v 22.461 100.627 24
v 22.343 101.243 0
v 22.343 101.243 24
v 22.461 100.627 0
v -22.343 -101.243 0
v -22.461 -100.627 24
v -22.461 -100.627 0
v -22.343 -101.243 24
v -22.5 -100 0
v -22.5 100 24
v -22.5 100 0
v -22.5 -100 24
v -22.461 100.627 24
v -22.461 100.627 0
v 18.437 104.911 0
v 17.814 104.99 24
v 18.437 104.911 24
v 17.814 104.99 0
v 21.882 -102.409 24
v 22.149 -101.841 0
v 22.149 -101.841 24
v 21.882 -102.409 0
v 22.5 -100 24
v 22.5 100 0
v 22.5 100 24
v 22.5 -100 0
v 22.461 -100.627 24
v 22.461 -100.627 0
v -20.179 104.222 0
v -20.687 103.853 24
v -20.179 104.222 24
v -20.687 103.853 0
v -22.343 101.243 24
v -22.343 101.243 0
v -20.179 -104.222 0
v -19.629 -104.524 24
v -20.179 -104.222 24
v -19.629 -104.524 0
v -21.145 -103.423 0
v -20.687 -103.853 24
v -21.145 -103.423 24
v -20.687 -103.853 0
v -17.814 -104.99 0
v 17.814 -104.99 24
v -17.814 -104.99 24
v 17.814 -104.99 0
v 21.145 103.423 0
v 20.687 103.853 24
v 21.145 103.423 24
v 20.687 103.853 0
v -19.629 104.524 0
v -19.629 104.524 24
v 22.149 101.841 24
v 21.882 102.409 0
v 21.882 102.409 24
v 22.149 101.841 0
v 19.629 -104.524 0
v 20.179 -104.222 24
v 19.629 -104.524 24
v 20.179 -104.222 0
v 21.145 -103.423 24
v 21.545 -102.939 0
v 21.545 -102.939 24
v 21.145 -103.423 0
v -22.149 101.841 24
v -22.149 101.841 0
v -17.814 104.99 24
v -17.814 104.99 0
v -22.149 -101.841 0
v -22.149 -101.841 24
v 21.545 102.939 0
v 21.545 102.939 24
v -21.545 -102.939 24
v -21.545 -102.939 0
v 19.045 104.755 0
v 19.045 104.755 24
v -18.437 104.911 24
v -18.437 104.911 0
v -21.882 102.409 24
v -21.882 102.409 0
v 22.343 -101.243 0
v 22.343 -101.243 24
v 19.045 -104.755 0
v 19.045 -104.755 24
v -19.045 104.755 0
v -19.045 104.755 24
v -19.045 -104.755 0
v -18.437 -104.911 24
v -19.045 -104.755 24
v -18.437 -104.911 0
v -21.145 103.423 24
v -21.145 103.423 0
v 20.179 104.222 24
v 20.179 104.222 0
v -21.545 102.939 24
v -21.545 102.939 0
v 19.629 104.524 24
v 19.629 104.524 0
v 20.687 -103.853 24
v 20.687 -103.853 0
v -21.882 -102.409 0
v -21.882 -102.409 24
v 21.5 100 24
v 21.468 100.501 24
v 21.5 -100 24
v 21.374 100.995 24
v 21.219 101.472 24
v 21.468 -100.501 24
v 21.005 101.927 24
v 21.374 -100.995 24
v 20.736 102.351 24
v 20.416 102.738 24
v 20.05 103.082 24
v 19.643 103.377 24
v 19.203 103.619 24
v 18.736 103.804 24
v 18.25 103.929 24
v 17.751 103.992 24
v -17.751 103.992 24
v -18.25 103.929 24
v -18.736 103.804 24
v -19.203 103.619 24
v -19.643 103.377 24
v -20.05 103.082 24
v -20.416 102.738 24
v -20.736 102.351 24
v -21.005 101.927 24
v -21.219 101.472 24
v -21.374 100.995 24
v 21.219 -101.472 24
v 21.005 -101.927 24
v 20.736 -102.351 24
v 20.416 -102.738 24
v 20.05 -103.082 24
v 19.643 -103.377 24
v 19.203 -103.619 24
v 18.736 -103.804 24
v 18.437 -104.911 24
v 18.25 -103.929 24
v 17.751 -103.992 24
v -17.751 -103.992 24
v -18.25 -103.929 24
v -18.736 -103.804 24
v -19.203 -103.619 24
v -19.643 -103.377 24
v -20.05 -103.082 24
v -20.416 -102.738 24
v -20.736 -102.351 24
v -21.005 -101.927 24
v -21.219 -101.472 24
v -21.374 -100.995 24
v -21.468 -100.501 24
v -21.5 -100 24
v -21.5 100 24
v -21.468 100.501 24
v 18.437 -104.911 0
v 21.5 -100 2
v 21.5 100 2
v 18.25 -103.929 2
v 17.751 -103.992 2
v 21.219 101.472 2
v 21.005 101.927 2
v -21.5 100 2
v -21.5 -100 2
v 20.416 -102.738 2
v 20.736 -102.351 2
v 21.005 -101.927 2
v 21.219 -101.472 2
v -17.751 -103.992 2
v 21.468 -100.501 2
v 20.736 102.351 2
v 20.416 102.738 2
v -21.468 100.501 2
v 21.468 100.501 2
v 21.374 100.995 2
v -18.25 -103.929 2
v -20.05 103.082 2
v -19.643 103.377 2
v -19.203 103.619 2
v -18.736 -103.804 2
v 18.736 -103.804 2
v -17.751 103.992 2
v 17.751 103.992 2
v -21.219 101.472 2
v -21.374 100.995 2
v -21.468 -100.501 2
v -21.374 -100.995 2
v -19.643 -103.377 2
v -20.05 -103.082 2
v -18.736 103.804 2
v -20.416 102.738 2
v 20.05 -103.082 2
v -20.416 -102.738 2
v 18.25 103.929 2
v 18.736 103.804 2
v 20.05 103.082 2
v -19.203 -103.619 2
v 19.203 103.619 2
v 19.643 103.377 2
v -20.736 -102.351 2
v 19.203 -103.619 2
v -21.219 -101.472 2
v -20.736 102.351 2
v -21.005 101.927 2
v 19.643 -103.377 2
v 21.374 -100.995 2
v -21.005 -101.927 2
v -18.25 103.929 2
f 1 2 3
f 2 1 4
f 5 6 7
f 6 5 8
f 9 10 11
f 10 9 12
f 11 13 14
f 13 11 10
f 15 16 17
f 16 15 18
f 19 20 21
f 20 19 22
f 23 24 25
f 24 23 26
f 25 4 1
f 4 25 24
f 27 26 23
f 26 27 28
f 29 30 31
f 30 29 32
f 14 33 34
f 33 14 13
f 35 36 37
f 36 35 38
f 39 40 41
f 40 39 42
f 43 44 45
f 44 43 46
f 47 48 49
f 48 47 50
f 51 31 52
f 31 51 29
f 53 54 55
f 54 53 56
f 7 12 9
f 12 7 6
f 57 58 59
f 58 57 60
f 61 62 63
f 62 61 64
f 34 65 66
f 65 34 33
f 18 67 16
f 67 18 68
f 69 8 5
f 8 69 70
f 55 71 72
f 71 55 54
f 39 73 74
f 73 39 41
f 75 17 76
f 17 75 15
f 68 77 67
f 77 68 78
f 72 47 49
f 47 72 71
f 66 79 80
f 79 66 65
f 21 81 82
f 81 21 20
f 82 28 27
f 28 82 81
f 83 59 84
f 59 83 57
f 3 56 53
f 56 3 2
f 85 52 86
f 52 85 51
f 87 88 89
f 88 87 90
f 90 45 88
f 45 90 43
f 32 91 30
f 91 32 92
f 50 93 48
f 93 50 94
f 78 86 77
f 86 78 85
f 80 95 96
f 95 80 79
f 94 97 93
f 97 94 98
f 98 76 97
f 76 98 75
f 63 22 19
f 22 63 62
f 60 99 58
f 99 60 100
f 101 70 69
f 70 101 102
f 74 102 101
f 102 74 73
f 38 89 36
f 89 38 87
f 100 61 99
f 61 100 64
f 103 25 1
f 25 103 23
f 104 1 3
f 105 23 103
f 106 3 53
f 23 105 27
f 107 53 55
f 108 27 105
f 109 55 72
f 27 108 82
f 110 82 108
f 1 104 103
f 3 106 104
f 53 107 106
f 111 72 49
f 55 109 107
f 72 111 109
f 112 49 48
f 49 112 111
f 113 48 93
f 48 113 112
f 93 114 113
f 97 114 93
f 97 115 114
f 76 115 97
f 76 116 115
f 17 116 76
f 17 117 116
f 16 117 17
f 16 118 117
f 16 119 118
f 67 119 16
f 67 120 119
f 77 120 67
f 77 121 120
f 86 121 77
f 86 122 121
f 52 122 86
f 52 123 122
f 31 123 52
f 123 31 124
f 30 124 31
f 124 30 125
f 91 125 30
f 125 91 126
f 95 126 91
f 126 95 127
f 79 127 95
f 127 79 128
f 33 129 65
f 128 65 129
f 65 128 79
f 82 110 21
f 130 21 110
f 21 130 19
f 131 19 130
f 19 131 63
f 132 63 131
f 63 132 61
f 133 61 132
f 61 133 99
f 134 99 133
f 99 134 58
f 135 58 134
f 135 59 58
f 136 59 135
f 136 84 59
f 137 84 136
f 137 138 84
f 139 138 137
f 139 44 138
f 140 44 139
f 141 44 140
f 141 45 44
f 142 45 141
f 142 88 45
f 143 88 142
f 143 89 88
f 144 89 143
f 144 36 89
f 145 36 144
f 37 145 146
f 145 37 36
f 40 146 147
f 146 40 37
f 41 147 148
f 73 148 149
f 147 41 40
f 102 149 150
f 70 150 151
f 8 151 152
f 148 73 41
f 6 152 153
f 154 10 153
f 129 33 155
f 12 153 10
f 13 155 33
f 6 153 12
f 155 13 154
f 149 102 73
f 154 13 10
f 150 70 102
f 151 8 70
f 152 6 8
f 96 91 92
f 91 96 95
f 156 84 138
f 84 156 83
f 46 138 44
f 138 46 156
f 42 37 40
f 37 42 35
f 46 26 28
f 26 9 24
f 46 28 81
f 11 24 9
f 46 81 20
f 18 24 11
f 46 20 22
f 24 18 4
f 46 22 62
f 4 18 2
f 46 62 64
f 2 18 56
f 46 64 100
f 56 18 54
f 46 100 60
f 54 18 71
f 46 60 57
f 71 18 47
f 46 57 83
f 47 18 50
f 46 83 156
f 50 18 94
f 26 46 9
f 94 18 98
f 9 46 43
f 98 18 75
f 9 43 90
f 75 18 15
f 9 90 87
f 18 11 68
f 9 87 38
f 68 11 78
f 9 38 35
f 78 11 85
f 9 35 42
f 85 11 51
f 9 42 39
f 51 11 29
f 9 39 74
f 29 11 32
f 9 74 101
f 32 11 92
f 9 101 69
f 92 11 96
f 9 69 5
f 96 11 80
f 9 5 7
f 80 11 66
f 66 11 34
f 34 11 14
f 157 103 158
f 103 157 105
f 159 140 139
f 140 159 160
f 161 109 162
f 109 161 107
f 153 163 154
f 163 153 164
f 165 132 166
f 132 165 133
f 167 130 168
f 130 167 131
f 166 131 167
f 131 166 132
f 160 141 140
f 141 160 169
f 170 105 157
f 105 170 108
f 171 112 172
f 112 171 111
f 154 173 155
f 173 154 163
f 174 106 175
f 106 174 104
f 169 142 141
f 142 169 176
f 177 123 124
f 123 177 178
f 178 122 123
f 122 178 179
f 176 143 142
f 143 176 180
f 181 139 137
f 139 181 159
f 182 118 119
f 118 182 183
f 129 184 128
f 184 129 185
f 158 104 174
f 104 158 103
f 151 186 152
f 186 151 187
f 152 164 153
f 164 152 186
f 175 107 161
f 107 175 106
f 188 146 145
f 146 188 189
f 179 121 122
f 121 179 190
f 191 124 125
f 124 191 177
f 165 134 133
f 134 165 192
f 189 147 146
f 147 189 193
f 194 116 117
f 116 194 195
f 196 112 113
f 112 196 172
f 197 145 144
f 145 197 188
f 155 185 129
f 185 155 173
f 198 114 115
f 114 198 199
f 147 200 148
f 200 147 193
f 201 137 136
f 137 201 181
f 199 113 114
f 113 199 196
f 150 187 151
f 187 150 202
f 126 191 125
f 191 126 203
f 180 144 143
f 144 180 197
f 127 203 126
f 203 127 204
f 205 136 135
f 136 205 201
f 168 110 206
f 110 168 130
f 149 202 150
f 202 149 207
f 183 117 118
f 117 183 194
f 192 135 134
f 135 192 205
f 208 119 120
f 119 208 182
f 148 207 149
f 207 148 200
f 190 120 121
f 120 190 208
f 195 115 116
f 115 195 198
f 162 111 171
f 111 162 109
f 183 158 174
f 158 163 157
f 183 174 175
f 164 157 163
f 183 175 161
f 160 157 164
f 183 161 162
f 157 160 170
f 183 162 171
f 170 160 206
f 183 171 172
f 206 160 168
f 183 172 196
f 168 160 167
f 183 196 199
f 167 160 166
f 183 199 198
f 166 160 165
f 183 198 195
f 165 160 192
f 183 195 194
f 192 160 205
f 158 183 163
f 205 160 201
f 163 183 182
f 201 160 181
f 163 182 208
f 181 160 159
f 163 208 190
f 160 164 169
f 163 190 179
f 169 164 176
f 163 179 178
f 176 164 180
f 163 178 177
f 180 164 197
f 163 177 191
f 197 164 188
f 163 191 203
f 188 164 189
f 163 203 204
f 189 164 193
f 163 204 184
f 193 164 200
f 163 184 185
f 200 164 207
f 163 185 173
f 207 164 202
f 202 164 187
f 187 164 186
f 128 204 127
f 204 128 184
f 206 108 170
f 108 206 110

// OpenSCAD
$fn = 50;


difference() {
	union() {
		hull() {
			translate(v = [-17.5000000000, 100.0000000000, 0]) {
				cylinder(h = 24, r = 5);
			}
			translate(v = [17.5000000000, 100.0000000000, 0]) {
				cylinder(h = 24, r = 5);
			}
			translate(v = [-17.5000000000, -100.0000000000, 0]) {
				cylinder(h = 24, r = 5);
			}
			translate(v = [17.5000000000, -100.0000000000, 0]) {
				cylinder(h = 24, r = 5);
			}
		}
	}
	union() {
		translate(v = [0, 0, 2]) {
			hull() {
				translate(v = [-17.5000000000, 100.0000000000, 0]) {
					cylinder(h = 22, r = 4);
				}
				translate(v = [17.5000000000, 100.0000000000, 0]) {
					cylinder(h = 22, r = 4);
				}
				translate(v = [-17.5000000000, -100.0000000000, 0]) {
					cylinder(h = 22, r = 4);
				}
				translate(v = [17.5000000000, -100.0000000000, 0]) {
					cylinder(h = 22, r = 4);
				}
			}
		}
	}
}
